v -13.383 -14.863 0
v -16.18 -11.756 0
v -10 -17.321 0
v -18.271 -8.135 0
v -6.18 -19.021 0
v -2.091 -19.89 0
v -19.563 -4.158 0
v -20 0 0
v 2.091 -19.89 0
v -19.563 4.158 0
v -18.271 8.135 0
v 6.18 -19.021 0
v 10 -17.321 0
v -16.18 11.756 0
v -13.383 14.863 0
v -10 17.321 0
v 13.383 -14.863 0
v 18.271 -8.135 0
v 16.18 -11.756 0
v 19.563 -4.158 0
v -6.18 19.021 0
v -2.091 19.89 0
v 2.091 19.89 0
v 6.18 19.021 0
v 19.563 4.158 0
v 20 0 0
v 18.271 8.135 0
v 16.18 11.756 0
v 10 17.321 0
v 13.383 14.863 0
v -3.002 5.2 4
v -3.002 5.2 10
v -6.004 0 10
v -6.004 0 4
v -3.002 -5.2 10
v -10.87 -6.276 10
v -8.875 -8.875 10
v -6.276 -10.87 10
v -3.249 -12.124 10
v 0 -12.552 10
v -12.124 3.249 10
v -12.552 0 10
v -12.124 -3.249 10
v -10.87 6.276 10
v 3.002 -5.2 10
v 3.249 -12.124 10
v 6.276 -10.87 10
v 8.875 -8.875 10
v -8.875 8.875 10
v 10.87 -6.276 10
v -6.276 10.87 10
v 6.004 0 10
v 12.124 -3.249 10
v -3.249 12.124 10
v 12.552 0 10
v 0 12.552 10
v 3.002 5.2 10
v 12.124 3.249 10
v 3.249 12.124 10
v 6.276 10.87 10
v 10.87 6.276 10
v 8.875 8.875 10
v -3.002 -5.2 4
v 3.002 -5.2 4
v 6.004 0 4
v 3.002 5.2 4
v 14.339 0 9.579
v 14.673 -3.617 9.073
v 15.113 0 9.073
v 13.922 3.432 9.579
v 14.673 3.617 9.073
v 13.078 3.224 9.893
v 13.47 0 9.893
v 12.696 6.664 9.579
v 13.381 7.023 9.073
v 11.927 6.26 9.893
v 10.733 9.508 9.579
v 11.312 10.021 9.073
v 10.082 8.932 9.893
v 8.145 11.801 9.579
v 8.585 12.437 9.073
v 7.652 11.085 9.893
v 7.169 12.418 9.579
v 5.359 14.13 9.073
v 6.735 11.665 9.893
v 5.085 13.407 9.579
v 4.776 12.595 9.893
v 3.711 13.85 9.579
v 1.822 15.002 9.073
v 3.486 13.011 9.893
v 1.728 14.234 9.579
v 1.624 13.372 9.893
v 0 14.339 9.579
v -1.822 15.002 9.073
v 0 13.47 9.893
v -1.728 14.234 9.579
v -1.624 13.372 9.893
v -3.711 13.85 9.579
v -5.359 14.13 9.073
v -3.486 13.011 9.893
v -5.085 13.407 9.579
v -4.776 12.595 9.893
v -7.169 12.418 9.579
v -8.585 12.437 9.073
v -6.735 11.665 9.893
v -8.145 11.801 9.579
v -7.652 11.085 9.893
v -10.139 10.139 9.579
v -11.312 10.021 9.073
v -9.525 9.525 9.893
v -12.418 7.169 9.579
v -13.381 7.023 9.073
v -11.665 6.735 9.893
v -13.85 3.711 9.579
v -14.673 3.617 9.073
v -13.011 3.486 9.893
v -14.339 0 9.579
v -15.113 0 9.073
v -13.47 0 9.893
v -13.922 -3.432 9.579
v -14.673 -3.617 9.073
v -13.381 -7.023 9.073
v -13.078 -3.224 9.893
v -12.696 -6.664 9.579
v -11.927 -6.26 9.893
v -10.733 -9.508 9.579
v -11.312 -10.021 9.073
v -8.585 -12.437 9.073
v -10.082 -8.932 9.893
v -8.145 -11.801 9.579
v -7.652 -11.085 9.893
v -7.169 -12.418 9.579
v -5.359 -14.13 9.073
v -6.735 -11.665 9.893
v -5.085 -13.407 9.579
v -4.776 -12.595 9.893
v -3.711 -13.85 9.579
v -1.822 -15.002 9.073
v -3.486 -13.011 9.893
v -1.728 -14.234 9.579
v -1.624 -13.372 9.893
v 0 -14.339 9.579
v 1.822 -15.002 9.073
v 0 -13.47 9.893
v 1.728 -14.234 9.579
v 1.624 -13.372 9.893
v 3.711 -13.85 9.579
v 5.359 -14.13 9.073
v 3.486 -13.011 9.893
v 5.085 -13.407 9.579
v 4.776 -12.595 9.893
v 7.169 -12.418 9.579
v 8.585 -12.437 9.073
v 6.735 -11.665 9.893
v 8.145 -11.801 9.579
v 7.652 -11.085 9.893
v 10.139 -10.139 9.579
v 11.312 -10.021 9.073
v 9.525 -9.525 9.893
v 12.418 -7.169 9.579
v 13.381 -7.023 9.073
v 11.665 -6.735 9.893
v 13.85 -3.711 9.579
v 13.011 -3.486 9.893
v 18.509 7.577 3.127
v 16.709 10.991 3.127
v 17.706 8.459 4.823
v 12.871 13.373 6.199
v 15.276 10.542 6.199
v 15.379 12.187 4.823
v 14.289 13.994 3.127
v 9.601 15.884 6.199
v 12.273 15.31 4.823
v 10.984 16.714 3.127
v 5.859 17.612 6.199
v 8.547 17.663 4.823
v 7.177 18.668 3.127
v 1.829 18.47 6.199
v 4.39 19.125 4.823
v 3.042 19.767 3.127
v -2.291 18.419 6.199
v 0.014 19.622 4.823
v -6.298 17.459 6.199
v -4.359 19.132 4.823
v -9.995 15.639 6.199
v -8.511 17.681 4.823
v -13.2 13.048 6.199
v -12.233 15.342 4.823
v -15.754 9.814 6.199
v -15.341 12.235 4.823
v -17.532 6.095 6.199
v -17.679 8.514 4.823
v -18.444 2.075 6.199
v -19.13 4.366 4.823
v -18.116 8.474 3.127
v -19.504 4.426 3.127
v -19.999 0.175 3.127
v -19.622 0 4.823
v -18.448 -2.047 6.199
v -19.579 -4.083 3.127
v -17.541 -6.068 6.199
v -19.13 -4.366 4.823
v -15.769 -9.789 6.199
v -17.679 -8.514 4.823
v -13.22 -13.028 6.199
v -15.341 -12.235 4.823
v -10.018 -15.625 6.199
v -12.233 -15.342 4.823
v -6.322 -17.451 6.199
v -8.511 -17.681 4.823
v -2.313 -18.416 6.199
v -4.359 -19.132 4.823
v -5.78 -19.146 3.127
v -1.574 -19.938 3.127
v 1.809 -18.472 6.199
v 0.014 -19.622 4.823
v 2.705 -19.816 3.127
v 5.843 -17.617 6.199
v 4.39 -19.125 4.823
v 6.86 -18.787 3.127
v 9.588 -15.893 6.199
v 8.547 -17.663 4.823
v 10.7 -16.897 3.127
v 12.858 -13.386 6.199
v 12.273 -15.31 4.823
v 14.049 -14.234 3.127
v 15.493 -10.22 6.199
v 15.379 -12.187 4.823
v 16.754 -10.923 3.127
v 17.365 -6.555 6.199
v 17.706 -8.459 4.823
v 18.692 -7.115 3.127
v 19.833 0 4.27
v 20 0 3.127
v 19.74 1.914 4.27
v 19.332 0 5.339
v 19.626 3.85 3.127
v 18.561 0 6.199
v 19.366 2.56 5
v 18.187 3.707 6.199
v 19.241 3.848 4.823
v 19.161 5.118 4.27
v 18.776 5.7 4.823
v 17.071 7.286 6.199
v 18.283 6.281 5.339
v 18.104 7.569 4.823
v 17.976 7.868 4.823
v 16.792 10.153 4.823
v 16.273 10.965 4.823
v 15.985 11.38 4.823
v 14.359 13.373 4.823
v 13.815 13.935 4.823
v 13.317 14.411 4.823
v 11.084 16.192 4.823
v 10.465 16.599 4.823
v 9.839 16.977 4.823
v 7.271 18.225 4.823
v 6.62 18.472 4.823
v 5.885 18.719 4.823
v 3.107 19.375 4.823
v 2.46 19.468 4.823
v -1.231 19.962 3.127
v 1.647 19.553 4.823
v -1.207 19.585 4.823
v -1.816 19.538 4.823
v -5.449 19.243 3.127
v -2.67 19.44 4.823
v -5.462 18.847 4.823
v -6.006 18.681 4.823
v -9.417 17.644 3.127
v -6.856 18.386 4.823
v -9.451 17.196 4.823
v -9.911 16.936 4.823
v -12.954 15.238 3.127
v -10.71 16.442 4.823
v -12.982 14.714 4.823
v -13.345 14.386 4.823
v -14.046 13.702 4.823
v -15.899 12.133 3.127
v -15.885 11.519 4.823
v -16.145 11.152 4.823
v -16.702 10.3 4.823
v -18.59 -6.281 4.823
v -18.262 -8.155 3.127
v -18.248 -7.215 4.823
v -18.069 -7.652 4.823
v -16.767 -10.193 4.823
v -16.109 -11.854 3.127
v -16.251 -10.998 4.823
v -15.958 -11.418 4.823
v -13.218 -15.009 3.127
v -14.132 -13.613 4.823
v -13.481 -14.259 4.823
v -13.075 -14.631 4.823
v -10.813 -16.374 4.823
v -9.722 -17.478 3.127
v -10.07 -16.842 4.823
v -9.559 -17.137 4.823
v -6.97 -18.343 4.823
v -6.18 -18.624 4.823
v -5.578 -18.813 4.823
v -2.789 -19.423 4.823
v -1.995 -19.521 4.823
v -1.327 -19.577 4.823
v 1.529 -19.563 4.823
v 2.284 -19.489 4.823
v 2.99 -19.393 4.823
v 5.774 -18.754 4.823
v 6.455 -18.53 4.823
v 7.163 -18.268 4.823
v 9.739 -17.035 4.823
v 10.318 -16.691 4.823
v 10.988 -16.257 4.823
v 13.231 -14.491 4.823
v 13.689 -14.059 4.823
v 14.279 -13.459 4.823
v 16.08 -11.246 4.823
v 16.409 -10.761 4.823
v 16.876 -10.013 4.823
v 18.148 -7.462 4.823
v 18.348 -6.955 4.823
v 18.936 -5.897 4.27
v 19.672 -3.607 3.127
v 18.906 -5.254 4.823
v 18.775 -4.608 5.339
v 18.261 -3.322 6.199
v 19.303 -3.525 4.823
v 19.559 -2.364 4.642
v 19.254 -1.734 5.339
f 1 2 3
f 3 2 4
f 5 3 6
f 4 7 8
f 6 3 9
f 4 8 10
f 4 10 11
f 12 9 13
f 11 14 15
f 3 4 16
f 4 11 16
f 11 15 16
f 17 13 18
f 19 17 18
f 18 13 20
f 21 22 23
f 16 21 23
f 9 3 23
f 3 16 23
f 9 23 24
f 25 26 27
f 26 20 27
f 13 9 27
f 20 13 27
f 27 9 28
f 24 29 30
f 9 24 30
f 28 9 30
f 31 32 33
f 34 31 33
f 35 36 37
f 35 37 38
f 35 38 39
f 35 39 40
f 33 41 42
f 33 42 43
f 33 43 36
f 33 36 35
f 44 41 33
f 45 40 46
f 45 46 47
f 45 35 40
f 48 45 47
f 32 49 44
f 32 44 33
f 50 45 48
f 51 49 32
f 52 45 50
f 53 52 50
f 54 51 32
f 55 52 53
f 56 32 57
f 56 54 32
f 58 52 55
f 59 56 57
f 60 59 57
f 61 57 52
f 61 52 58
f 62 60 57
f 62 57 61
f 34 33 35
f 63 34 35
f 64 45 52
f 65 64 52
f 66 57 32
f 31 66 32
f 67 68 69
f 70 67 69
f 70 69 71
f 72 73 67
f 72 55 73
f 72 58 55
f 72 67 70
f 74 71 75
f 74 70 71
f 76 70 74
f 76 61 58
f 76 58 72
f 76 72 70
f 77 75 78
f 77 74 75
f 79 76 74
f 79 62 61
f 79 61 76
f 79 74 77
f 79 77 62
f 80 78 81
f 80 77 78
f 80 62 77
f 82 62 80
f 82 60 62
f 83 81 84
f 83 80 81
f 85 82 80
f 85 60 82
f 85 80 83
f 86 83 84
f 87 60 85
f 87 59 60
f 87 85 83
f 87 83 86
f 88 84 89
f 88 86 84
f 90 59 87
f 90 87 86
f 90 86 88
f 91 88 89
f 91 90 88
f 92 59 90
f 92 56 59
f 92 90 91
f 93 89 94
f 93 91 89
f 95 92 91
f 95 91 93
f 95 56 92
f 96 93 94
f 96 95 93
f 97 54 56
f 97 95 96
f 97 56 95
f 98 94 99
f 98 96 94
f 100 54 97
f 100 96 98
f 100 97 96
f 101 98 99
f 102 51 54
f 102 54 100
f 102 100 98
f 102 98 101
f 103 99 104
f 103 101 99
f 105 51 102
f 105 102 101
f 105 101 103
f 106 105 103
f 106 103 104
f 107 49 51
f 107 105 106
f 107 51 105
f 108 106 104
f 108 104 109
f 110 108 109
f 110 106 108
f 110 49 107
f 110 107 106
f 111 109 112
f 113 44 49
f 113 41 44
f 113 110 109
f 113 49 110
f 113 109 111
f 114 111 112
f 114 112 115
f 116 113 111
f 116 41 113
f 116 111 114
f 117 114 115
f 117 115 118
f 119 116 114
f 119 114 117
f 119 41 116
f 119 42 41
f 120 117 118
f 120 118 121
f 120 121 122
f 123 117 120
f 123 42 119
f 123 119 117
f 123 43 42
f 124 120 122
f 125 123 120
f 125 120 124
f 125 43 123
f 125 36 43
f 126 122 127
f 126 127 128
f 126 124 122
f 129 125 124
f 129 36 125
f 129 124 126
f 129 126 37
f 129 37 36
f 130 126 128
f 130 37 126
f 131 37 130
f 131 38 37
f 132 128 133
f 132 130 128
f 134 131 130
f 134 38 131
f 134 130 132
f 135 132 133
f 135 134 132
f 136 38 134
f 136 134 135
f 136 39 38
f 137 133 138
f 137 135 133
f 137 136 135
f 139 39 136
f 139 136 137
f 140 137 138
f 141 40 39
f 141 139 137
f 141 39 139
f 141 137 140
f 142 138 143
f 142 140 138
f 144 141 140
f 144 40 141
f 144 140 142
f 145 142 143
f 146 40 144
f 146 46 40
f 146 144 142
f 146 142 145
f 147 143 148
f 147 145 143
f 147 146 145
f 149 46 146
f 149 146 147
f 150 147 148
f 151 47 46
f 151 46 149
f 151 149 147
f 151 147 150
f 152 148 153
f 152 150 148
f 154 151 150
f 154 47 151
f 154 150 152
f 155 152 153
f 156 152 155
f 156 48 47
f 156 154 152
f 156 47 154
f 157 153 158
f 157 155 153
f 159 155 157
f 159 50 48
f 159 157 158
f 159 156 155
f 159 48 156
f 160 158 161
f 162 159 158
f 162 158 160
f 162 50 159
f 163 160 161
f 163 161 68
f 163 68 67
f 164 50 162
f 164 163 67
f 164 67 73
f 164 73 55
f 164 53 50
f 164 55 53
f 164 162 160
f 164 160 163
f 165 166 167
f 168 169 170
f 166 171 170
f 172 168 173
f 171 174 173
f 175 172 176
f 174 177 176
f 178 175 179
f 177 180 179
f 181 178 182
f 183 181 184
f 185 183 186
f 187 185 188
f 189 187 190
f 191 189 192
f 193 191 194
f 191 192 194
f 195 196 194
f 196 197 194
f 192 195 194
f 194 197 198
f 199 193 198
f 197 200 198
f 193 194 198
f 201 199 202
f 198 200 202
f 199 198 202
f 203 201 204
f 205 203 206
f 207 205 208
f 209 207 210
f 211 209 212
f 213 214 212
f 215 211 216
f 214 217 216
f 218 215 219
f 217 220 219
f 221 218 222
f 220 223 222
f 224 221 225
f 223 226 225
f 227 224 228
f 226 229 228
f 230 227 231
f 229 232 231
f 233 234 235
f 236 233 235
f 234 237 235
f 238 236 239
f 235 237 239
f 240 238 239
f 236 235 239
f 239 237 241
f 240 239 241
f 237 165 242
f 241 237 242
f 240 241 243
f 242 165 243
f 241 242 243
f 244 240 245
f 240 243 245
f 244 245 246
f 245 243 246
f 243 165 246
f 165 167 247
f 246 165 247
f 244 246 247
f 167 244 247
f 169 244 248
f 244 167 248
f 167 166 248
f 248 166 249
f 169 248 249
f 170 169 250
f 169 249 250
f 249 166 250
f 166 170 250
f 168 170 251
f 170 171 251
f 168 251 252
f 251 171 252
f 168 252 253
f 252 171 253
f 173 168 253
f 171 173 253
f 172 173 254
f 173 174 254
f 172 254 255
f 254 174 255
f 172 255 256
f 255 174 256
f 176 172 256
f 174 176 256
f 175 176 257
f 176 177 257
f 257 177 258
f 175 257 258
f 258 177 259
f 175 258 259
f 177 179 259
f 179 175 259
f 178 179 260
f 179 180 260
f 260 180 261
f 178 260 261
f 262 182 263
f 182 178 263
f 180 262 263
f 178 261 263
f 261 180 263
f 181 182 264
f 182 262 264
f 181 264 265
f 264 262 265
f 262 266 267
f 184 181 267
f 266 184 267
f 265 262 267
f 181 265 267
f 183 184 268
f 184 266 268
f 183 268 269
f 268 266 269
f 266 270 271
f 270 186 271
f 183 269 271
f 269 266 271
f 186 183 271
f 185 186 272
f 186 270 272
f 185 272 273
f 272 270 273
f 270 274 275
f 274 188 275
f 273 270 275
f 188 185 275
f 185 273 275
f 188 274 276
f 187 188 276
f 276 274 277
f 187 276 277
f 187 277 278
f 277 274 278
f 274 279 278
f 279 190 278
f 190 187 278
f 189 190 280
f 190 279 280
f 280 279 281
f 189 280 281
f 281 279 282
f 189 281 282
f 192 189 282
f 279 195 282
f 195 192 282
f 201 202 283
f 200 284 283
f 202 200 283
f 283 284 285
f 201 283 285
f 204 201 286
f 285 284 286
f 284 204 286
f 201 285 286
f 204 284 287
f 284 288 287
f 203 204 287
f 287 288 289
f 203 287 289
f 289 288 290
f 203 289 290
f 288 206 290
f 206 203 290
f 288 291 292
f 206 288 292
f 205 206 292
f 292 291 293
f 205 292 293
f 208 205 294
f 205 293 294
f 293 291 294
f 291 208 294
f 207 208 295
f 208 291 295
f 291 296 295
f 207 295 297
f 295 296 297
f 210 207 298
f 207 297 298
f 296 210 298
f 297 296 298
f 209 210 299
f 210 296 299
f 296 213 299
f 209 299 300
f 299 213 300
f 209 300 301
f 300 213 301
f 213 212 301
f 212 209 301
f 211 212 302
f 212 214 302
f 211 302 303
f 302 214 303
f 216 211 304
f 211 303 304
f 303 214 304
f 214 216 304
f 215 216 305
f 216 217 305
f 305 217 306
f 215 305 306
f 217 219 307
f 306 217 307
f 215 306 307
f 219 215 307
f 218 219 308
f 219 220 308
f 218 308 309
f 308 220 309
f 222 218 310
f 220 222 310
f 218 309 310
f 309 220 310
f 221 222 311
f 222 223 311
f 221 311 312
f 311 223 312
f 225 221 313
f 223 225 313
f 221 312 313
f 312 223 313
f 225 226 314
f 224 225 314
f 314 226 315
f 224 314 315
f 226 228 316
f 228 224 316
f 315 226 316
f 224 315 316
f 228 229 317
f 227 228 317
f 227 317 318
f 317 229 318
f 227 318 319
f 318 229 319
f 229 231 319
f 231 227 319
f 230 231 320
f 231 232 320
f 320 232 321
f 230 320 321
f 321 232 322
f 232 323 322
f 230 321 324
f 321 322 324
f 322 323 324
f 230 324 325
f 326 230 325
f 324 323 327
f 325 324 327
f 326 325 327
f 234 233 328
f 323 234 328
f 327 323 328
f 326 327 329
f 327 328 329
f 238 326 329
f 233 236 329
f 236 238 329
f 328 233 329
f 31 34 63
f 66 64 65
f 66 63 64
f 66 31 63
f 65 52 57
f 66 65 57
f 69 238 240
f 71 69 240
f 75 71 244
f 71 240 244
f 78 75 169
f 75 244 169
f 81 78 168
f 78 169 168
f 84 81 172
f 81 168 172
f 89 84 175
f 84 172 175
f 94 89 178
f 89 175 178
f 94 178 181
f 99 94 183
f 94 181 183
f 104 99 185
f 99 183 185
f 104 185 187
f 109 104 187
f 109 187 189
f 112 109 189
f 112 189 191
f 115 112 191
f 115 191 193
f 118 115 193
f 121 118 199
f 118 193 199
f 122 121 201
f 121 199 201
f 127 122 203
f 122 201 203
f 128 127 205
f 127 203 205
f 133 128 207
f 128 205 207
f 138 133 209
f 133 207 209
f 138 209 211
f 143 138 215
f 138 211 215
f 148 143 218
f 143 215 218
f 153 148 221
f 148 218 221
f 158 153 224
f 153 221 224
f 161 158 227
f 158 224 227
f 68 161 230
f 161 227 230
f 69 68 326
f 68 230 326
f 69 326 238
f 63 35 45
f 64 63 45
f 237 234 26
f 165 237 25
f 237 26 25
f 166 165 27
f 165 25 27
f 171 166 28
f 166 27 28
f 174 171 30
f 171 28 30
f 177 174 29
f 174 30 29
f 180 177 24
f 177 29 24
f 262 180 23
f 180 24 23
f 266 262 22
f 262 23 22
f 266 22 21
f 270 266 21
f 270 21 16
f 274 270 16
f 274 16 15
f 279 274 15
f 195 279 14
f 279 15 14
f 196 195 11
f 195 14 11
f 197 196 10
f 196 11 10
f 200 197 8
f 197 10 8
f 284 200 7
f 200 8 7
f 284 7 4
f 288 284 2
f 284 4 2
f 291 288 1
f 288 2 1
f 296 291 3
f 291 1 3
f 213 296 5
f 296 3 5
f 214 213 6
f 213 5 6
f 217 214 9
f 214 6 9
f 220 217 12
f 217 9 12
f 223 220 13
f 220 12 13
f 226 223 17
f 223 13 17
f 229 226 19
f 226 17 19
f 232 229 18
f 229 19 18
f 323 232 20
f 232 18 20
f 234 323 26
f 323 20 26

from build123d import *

# Parameters (mm, degrees)
F0_R     = 20
F1_DEPTH = 10
F3_DEPTH = 6
F4_SIZE2 = 5
F4_SIZE  = 6
F5_R     = 4


with BuildPart() as f1:
    # F0 (on Top) → F1 (new body)
    with BuildSketch(Plane.XY):
        Circle(F0_R)
    extrude(amount=F1_DEPTH)

    # F2 (on face) → F3 (cut)
    with BuildSketch(Plane.XY.offset(10)):
        Polygon((3.0022213998, -5.2), (6.0044427996, 0), (3.0022213998, 5.2), (-3.0022213998, 5.2), (-6.0044427996, 0), (-3.0022213998, -5.2), align=None)
    extrude(amount=-F3_DEPTH, mode=Mode.SUBTRACT)

    # F4
    f4_edges = [f1.edges().sort_by_distance(p)[0] for p in [
        (-20, 0, 10),
    ]]
    f4_side = f1.faces().sort_by_distance((-19.434315, 0, 10))[0]
    chamfer(f4_edges, length=F4_SIZE, length2=F4_SIZE2, reference=f4_side)

    # F5
    f5_edges = [f1.edges().sort_by_distance(p)[0] for p in [
        (-14, 0, 10),
        (-20, 0, 5),
    ]]
    fillet(f5_edges, radius=F5_R)


solid = f1.part
